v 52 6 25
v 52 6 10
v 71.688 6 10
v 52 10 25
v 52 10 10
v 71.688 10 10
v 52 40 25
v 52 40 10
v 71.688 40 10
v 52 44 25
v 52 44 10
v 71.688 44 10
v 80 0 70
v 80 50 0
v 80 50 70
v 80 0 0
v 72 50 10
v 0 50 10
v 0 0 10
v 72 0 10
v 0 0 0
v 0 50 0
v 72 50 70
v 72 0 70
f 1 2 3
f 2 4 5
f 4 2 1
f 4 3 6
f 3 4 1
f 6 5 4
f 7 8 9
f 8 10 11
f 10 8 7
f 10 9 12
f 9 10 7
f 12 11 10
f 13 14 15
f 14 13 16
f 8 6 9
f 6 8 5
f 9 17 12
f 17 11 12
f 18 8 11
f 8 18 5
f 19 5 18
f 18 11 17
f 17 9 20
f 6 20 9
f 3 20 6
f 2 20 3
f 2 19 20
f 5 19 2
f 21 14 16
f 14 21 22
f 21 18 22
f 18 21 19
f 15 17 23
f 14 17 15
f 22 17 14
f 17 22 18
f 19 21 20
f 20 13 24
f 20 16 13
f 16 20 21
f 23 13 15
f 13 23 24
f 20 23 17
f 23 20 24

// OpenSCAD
$fn = 32;

// ----------------------------------------------------------------------
// Rib bracket: 2-gusset L bracket
// ----------------------------------------------------------------------

// --- parameters (mm) ---
base_l = 80;              // foot length, X
base_w = 50;              // foot width, Y
base_t = 10;              // foot thickness
plate_t = 8;              // upright plate thickness
plate_h = 70;             // overall height
gus_l = 20;               // gusset leg along the foot
gus_h = 16;               // gusset height
gus_t = 4;                // gusset thickness
gus_edge = 6;             // gusset margin from the foot edge
n_gus = 2;                // gusset count

gus_pitch = (base_w - 2 * gus_edge - gus_t) / (n_gus - 1);  // gusset pitch

union() {
  cube([base_l, base_w, base_t]);
  translate([base_l - plate_t, 0, base_t - 1])
    cube([plate_t, base_w, plate_h - base_t + 1]);
  for (i = [0 : n_gus - 1])
    translate([base_l - plate_t - gus_l, gus_edge + i * gus_pitch, base_t - 1])
      rotate([-90, 0, 0])
        linear_extrude(height = gus_t)
          polygon(points = [[0, 0], [gus_l + 1, 0], [0, -gus_h]]);
}
